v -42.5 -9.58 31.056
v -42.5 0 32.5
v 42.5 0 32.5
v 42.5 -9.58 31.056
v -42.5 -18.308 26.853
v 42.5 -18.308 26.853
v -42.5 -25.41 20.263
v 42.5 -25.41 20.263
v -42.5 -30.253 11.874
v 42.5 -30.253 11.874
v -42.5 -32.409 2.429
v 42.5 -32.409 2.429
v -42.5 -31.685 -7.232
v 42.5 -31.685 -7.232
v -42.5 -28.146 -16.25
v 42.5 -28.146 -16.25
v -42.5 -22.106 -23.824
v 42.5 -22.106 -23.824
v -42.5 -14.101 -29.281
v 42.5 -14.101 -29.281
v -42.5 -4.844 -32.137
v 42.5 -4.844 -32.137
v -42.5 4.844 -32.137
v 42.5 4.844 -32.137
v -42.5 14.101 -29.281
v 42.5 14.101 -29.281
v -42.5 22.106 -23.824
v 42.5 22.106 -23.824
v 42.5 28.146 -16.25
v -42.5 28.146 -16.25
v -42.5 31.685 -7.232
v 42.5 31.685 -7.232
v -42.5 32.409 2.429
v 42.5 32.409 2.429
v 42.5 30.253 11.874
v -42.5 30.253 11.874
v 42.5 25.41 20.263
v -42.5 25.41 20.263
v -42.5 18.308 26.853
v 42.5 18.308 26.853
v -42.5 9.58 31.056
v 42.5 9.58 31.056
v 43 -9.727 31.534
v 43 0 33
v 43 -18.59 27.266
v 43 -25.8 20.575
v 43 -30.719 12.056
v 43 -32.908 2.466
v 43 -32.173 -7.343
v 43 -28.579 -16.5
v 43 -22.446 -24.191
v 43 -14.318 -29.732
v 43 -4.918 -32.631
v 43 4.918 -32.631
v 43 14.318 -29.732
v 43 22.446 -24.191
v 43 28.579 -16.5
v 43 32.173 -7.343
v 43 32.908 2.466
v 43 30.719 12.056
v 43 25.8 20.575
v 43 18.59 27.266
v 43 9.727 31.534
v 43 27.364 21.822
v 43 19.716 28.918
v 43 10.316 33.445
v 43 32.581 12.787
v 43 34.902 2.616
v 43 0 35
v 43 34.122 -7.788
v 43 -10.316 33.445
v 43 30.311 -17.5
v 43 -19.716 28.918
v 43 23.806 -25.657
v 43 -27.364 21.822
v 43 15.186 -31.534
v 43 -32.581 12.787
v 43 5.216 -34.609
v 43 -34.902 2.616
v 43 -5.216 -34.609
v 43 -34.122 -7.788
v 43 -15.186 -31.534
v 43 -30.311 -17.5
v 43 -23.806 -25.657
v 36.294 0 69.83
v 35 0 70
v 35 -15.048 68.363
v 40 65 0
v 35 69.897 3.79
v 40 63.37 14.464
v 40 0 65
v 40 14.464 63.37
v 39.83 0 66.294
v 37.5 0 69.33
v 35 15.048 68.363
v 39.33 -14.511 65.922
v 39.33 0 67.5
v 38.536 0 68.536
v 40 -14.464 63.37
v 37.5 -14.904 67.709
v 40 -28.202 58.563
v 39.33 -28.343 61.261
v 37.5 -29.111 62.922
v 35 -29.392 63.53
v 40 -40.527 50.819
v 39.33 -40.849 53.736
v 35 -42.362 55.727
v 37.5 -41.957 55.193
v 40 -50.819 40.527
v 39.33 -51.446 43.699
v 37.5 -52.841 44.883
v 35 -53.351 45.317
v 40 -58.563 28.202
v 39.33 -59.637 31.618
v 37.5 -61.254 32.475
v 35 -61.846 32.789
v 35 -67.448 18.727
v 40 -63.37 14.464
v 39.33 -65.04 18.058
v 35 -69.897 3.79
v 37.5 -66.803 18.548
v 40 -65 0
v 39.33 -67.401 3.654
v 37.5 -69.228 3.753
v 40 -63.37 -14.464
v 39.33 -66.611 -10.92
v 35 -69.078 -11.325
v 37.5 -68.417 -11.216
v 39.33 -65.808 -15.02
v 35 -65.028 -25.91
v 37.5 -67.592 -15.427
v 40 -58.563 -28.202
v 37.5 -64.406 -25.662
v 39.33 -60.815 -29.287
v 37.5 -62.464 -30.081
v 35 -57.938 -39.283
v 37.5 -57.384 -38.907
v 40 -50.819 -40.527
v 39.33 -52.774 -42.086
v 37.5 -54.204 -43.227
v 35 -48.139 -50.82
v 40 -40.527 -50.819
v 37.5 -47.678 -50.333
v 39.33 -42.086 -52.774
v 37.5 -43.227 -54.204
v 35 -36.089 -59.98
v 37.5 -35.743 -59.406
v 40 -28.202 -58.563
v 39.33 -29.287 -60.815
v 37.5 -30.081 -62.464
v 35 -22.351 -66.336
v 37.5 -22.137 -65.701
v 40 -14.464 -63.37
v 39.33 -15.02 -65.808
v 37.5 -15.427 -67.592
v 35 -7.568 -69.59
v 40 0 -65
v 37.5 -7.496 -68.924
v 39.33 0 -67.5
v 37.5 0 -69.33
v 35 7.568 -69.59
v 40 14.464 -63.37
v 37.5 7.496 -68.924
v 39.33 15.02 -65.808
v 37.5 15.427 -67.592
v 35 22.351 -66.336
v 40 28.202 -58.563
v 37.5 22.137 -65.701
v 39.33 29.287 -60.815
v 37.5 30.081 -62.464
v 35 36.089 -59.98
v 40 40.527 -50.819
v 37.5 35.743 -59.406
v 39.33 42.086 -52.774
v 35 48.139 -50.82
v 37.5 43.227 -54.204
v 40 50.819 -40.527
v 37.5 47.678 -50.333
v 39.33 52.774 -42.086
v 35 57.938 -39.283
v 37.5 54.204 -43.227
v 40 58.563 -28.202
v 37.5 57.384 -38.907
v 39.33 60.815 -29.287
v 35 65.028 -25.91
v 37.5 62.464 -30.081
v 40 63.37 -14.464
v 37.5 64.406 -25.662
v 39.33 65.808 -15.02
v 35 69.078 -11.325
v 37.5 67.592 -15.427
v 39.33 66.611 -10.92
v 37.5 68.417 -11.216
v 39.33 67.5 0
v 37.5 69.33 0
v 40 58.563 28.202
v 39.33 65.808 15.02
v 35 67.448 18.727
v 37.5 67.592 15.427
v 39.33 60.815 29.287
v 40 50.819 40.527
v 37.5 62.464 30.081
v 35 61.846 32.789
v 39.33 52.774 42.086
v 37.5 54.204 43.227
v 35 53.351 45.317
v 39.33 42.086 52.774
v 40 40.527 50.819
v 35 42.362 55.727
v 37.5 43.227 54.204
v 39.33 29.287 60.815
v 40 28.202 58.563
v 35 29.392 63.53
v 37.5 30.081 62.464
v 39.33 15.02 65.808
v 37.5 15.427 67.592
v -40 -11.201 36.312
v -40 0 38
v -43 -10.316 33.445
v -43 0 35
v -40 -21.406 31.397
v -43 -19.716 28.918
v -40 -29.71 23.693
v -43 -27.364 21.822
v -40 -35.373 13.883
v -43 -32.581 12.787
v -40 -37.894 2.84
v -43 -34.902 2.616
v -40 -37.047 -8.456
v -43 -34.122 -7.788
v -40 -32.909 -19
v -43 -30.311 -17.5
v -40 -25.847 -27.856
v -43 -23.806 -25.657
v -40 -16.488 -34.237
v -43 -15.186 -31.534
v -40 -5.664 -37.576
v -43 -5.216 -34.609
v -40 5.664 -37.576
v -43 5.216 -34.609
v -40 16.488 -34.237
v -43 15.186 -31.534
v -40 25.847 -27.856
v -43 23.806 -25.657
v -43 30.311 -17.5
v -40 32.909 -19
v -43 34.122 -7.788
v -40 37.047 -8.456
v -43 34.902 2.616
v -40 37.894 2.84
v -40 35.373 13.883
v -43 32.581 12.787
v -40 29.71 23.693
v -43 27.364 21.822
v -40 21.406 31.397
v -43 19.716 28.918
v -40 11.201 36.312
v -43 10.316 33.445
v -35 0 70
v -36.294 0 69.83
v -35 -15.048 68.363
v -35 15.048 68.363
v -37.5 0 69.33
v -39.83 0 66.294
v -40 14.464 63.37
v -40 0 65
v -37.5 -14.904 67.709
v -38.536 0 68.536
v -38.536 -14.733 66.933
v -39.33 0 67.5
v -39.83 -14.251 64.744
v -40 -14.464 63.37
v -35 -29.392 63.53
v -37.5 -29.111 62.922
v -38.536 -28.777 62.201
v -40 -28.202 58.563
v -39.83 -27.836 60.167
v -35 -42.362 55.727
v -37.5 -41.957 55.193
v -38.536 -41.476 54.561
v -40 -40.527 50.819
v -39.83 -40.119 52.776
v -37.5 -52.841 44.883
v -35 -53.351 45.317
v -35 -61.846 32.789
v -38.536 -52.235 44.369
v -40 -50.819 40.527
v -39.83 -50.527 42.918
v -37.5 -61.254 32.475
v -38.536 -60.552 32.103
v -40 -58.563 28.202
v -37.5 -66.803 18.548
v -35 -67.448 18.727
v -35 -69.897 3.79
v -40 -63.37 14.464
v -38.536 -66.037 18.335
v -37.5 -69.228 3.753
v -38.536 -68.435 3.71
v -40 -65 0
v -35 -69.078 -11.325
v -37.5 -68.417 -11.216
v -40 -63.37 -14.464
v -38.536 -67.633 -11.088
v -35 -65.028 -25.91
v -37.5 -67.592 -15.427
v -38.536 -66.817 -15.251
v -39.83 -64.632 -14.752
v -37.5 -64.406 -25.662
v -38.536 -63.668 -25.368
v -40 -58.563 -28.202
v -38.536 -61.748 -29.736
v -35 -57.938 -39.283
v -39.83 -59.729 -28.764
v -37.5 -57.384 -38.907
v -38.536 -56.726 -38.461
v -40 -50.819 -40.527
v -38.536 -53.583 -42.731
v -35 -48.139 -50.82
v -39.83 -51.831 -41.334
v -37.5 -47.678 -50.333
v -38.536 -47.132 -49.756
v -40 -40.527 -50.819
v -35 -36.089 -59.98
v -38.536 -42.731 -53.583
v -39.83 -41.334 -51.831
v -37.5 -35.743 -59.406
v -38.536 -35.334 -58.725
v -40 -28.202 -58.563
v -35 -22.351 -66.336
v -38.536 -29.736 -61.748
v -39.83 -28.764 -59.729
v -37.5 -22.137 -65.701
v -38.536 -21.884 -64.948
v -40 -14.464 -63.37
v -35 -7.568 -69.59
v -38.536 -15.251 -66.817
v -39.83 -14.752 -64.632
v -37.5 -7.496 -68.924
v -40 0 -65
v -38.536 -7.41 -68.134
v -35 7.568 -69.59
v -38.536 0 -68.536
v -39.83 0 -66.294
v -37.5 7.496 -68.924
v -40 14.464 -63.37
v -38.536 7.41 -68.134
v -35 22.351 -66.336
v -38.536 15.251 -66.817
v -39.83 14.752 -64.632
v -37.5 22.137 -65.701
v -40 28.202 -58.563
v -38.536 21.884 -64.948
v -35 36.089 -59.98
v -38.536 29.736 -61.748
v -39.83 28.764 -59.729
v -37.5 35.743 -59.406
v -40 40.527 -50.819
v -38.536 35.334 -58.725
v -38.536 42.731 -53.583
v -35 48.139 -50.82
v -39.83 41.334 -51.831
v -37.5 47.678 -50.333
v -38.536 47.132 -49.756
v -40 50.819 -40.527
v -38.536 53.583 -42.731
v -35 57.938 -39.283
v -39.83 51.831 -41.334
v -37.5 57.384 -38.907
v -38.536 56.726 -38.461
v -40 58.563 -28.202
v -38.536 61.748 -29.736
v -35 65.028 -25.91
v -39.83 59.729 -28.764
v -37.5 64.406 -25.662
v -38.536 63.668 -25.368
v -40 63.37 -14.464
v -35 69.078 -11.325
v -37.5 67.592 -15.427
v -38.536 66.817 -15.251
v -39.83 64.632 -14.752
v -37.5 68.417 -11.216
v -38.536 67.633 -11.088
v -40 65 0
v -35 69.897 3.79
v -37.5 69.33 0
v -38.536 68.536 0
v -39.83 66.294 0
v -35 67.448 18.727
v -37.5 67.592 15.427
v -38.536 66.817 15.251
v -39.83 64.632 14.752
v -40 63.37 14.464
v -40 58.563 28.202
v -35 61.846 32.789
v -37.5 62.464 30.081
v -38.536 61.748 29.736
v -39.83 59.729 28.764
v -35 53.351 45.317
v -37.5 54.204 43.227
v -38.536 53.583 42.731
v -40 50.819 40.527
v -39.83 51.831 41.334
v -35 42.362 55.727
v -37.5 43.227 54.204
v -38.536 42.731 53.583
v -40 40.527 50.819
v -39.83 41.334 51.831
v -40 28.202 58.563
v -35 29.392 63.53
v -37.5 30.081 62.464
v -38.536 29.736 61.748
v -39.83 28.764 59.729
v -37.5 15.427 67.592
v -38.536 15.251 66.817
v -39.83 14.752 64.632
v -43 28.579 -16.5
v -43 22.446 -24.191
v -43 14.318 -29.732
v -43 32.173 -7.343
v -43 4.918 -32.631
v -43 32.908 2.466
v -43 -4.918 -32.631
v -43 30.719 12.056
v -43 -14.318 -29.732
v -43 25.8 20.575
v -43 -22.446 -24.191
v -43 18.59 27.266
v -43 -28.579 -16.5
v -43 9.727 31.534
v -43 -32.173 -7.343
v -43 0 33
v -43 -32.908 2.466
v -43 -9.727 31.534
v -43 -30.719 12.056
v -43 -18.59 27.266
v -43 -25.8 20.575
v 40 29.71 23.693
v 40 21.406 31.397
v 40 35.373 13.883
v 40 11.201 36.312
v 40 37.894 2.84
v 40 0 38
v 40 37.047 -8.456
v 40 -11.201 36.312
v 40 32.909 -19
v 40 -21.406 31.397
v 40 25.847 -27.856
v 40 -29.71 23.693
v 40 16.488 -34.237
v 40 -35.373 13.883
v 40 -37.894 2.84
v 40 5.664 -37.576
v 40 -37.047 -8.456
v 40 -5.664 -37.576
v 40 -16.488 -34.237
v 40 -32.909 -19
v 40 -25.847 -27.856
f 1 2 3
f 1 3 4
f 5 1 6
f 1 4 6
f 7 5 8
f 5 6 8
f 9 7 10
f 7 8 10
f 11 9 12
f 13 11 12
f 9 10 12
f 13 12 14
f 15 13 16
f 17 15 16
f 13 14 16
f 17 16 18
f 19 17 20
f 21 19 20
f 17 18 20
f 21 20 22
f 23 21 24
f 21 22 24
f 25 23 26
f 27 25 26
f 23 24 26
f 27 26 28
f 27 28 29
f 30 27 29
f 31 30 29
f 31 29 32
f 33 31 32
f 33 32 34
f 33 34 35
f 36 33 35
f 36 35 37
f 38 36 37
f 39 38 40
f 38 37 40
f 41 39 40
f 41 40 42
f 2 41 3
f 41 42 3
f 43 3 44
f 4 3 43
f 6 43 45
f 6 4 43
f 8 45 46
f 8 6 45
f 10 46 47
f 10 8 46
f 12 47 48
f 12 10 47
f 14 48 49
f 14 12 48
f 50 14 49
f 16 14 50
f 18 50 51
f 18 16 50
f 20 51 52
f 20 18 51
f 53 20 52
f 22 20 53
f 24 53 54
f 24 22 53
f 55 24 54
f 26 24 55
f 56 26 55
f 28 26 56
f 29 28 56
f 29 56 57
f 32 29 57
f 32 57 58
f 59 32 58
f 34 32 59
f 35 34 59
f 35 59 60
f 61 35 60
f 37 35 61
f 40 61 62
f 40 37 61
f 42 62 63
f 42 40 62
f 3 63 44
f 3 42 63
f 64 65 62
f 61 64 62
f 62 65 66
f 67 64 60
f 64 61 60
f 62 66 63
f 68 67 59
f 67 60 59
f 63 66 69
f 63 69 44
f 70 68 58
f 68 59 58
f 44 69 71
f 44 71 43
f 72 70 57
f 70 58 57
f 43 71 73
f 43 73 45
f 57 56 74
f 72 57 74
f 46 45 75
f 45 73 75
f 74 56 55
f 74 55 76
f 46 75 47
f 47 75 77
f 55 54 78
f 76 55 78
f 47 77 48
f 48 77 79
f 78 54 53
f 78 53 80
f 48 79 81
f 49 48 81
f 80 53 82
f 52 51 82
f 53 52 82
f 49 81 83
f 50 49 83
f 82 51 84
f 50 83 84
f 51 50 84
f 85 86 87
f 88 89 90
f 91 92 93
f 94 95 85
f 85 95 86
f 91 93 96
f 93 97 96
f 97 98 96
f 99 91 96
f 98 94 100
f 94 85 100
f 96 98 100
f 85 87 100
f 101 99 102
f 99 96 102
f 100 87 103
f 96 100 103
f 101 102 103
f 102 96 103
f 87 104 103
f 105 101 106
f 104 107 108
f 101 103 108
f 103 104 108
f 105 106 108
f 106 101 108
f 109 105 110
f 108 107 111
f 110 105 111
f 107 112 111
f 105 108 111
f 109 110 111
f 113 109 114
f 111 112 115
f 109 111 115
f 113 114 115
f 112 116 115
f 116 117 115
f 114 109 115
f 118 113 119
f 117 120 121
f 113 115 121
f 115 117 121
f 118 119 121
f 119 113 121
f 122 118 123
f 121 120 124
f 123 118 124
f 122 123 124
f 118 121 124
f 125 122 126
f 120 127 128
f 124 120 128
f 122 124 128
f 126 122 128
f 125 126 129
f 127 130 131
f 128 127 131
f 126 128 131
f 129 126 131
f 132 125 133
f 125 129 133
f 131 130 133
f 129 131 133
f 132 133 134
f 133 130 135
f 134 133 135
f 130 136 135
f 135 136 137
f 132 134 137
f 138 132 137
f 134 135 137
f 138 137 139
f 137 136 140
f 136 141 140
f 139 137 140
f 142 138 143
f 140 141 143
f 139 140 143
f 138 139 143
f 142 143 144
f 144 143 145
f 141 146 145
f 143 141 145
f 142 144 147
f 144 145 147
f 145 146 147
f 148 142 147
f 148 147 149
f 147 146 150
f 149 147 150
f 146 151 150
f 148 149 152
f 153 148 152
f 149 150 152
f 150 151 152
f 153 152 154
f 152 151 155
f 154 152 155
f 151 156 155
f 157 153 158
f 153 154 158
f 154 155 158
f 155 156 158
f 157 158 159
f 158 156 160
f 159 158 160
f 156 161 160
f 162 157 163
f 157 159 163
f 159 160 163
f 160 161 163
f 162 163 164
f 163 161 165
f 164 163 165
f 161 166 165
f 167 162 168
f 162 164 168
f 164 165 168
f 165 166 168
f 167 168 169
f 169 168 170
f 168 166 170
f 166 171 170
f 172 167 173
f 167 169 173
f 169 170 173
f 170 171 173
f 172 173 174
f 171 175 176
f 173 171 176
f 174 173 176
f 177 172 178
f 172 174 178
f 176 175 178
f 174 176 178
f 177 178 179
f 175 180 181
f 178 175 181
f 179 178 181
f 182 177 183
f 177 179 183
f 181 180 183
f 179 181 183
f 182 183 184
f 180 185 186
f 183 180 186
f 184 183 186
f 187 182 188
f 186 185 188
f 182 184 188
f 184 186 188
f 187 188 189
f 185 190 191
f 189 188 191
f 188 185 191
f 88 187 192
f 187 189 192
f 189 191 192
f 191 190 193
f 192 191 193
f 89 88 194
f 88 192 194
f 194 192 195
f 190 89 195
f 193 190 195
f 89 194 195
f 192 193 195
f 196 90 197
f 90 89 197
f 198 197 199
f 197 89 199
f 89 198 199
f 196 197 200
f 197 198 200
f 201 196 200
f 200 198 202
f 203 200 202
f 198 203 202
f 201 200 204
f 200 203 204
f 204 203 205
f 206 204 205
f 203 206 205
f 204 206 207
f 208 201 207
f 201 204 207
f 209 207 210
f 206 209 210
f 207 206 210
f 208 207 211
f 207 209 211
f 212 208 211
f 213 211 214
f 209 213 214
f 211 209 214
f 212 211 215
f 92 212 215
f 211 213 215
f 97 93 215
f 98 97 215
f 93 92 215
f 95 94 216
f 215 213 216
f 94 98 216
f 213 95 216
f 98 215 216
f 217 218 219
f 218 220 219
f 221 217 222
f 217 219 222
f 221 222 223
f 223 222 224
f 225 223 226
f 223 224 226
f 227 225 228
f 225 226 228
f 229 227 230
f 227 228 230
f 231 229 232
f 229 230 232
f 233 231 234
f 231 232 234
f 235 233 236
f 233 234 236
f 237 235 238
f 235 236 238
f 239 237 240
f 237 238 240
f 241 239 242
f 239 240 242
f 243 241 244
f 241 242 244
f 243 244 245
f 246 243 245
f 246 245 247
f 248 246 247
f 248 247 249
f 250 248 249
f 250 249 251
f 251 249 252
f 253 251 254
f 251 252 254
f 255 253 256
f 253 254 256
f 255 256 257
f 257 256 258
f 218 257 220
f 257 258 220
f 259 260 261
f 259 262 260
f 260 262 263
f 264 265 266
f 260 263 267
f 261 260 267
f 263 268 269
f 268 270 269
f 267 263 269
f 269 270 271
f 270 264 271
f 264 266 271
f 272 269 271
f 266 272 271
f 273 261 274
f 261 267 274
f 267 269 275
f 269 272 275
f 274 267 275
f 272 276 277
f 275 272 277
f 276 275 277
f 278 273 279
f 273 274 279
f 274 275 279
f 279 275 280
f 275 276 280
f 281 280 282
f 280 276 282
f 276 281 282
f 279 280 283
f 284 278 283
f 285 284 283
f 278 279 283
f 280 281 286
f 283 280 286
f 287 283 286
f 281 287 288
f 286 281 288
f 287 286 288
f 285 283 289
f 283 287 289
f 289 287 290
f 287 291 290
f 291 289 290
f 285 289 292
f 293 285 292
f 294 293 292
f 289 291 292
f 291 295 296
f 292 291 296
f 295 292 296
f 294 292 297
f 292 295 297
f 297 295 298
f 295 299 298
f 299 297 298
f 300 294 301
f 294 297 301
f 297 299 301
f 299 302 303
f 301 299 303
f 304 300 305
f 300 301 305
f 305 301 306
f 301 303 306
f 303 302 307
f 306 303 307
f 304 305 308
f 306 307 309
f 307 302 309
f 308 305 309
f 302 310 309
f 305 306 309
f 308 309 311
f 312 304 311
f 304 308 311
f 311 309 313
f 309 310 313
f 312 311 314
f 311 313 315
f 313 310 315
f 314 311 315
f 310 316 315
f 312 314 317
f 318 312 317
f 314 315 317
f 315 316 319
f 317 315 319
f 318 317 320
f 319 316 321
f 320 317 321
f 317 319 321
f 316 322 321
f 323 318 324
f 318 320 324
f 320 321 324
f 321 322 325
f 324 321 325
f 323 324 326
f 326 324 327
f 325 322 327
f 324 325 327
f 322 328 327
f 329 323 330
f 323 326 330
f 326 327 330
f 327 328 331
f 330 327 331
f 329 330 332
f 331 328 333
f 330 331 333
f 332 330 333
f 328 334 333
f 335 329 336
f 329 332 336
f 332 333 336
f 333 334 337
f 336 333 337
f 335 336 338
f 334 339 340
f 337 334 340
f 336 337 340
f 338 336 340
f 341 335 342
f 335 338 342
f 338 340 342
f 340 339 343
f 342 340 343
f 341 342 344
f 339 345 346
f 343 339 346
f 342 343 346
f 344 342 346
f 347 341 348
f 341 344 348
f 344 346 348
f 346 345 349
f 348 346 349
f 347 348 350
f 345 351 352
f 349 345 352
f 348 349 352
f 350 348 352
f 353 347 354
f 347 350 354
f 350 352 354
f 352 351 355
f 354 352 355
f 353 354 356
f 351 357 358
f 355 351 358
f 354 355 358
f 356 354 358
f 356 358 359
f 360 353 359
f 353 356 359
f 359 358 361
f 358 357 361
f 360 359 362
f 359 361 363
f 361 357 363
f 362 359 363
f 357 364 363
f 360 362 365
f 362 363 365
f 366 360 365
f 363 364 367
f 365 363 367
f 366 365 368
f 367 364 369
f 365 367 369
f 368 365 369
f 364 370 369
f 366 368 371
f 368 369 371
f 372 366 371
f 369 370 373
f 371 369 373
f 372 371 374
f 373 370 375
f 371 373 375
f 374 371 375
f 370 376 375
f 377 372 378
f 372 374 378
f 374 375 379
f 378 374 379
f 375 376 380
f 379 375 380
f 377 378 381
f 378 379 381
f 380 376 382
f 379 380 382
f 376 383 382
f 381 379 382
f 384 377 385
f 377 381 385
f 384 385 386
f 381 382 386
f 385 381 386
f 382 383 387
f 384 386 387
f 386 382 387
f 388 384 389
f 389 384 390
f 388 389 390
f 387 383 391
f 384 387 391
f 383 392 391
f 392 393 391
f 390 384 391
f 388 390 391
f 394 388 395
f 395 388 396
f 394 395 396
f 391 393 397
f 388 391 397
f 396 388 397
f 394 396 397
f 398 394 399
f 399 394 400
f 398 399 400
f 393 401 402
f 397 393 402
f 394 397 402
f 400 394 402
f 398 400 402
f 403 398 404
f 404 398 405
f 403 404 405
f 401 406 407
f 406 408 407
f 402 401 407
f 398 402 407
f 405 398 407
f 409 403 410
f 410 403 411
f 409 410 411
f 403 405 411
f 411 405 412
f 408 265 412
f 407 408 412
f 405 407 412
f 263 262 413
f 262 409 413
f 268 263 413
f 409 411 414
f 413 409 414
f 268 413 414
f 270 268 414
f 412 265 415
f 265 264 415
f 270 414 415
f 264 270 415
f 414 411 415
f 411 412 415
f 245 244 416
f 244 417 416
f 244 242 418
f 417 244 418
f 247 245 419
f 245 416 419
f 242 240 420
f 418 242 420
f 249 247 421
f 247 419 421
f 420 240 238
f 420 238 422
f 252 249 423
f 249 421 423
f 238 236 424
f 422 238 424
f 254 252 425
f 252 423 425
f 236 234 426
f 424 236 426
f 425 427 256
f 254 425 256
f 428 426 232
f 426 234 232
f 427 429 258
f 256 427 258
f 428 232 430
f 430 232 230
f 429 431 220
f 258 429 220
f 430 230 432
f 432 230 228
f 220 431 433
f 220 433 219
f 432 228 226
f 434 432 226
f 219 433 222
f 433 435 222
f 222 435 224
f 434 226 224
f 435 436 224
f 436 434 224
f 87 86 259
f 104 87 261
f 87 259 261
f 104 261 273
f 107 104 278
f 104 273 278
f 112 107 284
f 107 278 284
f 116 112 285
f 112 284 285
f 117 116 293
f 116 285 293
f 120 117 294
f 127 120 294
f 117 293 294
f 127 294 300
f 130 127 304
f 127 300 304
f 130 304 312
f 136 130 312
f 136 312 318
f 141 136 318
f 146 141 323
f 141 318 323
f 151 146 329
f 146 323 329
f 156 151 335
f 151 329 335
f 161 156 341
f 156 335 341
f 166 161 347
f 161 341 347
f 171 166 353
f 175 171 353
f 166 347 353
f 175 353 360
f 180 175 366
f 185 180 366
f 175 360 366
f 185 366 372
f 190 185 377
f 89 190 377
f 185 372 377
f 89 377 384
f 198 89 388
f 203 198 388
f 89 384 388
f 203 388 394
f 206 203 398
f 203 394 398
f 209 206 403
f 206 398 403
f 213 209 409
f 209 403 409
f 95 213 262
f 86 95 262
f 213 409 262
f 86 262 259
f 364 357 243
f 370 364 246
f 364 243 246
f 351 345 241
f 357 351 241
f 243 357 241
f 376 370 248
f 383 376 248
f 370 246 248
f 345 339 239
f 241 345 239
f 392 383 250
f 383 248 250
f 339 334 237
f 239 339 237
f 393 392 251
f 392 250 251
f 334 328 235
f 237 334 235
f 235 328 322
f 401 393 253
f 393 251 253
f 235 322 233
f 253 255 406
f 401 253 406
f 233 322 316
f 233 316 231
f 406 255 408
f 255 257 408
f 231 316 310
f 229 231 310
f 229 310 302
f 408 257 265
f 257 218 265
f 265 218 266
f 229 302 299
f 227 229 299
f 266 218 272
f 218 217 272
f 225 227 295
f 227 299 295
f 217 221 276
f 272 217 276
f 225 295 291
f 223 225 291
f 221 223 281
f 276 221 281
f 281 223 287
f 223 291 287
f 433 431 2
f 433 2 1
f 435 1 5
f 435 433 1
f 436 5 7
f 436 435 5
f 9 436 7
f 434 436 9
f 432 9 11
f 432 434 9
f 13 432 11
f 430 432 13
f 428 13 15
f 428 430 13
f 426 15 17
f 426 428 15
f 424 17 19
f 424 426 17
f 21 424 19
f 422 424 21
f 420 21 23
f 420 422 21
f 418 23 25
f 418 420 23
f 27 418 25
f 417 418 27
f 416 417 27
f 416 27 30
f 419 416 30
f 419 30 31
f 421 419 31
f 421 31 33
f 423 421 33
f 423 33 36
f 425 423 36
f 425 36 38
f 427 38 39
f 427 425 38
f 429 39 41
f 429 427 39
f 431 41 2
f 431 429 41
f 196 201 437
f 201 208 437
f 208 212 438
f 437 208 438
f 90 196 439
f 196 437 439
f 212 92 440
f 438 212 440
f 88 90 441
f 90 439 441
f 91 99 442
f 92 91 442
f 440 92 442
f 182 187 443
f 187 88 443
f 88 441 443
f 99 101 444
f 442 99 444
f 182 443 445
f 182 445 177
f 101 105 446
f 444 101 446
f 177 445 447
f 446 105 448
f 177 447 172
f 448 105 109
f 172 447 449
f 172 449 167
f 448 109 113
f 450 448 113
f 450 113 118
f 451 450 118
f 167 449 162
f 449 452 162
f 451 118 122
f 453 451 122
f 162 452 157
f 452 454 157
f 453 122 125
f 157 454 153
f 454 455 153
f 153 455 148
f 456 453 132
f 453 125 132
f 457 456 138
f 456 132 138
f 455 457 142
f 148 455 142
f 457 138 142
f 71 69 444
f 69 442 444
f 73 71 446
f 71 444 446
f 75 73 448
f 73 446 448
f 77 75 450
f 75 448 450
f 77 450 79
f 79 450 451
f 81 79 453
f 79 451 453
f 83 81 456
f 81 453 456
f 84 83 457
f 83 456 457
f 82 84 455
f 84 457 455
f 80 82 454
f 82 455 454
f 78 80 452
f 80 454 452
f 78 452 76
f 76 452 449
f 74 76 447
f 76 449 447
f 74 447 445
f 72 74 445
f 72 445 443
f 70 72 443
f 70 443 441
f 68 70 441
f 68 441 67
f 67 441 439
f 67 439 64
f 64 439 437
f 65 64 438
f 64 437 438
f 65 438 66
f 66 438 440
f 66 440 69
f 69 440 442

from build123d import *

# Parameters (mm, degrees)
F2_R    = 5
F3_SIZE = 0.5


with BuildPart() as f1:
    # F0 (on Front) → F1 (revolve)
    with BuildSketch(Plane.XZ):
        Polygon((-43, 35), (-43, 32.5), (43, 32.5), (43, 35), (40, 38), (40, 70), (-40, 70), (-40, 38), align=None)
    revolve(axis=Axis((10.727409, 0, 0), (1, 0, 0)))

    # F2
    f2_edges = [f1.edges().sort_by_distance(p)[0] for p in [
        (-40, 0, -70),
        (40, 0, -70),
    ]]
    fillet(f2_edges, radius=F2_R)

    # F3
    f3_edges = [f1.edges().sort_by_distance(p)[0] for p in [
        (-43, 0, -32.5),
        (43, 0, -32.5),
        (0, 0, 32.5),
    ]]
    chamfer(f3_edges, length=F3_SIZE)


solid = f1.part
